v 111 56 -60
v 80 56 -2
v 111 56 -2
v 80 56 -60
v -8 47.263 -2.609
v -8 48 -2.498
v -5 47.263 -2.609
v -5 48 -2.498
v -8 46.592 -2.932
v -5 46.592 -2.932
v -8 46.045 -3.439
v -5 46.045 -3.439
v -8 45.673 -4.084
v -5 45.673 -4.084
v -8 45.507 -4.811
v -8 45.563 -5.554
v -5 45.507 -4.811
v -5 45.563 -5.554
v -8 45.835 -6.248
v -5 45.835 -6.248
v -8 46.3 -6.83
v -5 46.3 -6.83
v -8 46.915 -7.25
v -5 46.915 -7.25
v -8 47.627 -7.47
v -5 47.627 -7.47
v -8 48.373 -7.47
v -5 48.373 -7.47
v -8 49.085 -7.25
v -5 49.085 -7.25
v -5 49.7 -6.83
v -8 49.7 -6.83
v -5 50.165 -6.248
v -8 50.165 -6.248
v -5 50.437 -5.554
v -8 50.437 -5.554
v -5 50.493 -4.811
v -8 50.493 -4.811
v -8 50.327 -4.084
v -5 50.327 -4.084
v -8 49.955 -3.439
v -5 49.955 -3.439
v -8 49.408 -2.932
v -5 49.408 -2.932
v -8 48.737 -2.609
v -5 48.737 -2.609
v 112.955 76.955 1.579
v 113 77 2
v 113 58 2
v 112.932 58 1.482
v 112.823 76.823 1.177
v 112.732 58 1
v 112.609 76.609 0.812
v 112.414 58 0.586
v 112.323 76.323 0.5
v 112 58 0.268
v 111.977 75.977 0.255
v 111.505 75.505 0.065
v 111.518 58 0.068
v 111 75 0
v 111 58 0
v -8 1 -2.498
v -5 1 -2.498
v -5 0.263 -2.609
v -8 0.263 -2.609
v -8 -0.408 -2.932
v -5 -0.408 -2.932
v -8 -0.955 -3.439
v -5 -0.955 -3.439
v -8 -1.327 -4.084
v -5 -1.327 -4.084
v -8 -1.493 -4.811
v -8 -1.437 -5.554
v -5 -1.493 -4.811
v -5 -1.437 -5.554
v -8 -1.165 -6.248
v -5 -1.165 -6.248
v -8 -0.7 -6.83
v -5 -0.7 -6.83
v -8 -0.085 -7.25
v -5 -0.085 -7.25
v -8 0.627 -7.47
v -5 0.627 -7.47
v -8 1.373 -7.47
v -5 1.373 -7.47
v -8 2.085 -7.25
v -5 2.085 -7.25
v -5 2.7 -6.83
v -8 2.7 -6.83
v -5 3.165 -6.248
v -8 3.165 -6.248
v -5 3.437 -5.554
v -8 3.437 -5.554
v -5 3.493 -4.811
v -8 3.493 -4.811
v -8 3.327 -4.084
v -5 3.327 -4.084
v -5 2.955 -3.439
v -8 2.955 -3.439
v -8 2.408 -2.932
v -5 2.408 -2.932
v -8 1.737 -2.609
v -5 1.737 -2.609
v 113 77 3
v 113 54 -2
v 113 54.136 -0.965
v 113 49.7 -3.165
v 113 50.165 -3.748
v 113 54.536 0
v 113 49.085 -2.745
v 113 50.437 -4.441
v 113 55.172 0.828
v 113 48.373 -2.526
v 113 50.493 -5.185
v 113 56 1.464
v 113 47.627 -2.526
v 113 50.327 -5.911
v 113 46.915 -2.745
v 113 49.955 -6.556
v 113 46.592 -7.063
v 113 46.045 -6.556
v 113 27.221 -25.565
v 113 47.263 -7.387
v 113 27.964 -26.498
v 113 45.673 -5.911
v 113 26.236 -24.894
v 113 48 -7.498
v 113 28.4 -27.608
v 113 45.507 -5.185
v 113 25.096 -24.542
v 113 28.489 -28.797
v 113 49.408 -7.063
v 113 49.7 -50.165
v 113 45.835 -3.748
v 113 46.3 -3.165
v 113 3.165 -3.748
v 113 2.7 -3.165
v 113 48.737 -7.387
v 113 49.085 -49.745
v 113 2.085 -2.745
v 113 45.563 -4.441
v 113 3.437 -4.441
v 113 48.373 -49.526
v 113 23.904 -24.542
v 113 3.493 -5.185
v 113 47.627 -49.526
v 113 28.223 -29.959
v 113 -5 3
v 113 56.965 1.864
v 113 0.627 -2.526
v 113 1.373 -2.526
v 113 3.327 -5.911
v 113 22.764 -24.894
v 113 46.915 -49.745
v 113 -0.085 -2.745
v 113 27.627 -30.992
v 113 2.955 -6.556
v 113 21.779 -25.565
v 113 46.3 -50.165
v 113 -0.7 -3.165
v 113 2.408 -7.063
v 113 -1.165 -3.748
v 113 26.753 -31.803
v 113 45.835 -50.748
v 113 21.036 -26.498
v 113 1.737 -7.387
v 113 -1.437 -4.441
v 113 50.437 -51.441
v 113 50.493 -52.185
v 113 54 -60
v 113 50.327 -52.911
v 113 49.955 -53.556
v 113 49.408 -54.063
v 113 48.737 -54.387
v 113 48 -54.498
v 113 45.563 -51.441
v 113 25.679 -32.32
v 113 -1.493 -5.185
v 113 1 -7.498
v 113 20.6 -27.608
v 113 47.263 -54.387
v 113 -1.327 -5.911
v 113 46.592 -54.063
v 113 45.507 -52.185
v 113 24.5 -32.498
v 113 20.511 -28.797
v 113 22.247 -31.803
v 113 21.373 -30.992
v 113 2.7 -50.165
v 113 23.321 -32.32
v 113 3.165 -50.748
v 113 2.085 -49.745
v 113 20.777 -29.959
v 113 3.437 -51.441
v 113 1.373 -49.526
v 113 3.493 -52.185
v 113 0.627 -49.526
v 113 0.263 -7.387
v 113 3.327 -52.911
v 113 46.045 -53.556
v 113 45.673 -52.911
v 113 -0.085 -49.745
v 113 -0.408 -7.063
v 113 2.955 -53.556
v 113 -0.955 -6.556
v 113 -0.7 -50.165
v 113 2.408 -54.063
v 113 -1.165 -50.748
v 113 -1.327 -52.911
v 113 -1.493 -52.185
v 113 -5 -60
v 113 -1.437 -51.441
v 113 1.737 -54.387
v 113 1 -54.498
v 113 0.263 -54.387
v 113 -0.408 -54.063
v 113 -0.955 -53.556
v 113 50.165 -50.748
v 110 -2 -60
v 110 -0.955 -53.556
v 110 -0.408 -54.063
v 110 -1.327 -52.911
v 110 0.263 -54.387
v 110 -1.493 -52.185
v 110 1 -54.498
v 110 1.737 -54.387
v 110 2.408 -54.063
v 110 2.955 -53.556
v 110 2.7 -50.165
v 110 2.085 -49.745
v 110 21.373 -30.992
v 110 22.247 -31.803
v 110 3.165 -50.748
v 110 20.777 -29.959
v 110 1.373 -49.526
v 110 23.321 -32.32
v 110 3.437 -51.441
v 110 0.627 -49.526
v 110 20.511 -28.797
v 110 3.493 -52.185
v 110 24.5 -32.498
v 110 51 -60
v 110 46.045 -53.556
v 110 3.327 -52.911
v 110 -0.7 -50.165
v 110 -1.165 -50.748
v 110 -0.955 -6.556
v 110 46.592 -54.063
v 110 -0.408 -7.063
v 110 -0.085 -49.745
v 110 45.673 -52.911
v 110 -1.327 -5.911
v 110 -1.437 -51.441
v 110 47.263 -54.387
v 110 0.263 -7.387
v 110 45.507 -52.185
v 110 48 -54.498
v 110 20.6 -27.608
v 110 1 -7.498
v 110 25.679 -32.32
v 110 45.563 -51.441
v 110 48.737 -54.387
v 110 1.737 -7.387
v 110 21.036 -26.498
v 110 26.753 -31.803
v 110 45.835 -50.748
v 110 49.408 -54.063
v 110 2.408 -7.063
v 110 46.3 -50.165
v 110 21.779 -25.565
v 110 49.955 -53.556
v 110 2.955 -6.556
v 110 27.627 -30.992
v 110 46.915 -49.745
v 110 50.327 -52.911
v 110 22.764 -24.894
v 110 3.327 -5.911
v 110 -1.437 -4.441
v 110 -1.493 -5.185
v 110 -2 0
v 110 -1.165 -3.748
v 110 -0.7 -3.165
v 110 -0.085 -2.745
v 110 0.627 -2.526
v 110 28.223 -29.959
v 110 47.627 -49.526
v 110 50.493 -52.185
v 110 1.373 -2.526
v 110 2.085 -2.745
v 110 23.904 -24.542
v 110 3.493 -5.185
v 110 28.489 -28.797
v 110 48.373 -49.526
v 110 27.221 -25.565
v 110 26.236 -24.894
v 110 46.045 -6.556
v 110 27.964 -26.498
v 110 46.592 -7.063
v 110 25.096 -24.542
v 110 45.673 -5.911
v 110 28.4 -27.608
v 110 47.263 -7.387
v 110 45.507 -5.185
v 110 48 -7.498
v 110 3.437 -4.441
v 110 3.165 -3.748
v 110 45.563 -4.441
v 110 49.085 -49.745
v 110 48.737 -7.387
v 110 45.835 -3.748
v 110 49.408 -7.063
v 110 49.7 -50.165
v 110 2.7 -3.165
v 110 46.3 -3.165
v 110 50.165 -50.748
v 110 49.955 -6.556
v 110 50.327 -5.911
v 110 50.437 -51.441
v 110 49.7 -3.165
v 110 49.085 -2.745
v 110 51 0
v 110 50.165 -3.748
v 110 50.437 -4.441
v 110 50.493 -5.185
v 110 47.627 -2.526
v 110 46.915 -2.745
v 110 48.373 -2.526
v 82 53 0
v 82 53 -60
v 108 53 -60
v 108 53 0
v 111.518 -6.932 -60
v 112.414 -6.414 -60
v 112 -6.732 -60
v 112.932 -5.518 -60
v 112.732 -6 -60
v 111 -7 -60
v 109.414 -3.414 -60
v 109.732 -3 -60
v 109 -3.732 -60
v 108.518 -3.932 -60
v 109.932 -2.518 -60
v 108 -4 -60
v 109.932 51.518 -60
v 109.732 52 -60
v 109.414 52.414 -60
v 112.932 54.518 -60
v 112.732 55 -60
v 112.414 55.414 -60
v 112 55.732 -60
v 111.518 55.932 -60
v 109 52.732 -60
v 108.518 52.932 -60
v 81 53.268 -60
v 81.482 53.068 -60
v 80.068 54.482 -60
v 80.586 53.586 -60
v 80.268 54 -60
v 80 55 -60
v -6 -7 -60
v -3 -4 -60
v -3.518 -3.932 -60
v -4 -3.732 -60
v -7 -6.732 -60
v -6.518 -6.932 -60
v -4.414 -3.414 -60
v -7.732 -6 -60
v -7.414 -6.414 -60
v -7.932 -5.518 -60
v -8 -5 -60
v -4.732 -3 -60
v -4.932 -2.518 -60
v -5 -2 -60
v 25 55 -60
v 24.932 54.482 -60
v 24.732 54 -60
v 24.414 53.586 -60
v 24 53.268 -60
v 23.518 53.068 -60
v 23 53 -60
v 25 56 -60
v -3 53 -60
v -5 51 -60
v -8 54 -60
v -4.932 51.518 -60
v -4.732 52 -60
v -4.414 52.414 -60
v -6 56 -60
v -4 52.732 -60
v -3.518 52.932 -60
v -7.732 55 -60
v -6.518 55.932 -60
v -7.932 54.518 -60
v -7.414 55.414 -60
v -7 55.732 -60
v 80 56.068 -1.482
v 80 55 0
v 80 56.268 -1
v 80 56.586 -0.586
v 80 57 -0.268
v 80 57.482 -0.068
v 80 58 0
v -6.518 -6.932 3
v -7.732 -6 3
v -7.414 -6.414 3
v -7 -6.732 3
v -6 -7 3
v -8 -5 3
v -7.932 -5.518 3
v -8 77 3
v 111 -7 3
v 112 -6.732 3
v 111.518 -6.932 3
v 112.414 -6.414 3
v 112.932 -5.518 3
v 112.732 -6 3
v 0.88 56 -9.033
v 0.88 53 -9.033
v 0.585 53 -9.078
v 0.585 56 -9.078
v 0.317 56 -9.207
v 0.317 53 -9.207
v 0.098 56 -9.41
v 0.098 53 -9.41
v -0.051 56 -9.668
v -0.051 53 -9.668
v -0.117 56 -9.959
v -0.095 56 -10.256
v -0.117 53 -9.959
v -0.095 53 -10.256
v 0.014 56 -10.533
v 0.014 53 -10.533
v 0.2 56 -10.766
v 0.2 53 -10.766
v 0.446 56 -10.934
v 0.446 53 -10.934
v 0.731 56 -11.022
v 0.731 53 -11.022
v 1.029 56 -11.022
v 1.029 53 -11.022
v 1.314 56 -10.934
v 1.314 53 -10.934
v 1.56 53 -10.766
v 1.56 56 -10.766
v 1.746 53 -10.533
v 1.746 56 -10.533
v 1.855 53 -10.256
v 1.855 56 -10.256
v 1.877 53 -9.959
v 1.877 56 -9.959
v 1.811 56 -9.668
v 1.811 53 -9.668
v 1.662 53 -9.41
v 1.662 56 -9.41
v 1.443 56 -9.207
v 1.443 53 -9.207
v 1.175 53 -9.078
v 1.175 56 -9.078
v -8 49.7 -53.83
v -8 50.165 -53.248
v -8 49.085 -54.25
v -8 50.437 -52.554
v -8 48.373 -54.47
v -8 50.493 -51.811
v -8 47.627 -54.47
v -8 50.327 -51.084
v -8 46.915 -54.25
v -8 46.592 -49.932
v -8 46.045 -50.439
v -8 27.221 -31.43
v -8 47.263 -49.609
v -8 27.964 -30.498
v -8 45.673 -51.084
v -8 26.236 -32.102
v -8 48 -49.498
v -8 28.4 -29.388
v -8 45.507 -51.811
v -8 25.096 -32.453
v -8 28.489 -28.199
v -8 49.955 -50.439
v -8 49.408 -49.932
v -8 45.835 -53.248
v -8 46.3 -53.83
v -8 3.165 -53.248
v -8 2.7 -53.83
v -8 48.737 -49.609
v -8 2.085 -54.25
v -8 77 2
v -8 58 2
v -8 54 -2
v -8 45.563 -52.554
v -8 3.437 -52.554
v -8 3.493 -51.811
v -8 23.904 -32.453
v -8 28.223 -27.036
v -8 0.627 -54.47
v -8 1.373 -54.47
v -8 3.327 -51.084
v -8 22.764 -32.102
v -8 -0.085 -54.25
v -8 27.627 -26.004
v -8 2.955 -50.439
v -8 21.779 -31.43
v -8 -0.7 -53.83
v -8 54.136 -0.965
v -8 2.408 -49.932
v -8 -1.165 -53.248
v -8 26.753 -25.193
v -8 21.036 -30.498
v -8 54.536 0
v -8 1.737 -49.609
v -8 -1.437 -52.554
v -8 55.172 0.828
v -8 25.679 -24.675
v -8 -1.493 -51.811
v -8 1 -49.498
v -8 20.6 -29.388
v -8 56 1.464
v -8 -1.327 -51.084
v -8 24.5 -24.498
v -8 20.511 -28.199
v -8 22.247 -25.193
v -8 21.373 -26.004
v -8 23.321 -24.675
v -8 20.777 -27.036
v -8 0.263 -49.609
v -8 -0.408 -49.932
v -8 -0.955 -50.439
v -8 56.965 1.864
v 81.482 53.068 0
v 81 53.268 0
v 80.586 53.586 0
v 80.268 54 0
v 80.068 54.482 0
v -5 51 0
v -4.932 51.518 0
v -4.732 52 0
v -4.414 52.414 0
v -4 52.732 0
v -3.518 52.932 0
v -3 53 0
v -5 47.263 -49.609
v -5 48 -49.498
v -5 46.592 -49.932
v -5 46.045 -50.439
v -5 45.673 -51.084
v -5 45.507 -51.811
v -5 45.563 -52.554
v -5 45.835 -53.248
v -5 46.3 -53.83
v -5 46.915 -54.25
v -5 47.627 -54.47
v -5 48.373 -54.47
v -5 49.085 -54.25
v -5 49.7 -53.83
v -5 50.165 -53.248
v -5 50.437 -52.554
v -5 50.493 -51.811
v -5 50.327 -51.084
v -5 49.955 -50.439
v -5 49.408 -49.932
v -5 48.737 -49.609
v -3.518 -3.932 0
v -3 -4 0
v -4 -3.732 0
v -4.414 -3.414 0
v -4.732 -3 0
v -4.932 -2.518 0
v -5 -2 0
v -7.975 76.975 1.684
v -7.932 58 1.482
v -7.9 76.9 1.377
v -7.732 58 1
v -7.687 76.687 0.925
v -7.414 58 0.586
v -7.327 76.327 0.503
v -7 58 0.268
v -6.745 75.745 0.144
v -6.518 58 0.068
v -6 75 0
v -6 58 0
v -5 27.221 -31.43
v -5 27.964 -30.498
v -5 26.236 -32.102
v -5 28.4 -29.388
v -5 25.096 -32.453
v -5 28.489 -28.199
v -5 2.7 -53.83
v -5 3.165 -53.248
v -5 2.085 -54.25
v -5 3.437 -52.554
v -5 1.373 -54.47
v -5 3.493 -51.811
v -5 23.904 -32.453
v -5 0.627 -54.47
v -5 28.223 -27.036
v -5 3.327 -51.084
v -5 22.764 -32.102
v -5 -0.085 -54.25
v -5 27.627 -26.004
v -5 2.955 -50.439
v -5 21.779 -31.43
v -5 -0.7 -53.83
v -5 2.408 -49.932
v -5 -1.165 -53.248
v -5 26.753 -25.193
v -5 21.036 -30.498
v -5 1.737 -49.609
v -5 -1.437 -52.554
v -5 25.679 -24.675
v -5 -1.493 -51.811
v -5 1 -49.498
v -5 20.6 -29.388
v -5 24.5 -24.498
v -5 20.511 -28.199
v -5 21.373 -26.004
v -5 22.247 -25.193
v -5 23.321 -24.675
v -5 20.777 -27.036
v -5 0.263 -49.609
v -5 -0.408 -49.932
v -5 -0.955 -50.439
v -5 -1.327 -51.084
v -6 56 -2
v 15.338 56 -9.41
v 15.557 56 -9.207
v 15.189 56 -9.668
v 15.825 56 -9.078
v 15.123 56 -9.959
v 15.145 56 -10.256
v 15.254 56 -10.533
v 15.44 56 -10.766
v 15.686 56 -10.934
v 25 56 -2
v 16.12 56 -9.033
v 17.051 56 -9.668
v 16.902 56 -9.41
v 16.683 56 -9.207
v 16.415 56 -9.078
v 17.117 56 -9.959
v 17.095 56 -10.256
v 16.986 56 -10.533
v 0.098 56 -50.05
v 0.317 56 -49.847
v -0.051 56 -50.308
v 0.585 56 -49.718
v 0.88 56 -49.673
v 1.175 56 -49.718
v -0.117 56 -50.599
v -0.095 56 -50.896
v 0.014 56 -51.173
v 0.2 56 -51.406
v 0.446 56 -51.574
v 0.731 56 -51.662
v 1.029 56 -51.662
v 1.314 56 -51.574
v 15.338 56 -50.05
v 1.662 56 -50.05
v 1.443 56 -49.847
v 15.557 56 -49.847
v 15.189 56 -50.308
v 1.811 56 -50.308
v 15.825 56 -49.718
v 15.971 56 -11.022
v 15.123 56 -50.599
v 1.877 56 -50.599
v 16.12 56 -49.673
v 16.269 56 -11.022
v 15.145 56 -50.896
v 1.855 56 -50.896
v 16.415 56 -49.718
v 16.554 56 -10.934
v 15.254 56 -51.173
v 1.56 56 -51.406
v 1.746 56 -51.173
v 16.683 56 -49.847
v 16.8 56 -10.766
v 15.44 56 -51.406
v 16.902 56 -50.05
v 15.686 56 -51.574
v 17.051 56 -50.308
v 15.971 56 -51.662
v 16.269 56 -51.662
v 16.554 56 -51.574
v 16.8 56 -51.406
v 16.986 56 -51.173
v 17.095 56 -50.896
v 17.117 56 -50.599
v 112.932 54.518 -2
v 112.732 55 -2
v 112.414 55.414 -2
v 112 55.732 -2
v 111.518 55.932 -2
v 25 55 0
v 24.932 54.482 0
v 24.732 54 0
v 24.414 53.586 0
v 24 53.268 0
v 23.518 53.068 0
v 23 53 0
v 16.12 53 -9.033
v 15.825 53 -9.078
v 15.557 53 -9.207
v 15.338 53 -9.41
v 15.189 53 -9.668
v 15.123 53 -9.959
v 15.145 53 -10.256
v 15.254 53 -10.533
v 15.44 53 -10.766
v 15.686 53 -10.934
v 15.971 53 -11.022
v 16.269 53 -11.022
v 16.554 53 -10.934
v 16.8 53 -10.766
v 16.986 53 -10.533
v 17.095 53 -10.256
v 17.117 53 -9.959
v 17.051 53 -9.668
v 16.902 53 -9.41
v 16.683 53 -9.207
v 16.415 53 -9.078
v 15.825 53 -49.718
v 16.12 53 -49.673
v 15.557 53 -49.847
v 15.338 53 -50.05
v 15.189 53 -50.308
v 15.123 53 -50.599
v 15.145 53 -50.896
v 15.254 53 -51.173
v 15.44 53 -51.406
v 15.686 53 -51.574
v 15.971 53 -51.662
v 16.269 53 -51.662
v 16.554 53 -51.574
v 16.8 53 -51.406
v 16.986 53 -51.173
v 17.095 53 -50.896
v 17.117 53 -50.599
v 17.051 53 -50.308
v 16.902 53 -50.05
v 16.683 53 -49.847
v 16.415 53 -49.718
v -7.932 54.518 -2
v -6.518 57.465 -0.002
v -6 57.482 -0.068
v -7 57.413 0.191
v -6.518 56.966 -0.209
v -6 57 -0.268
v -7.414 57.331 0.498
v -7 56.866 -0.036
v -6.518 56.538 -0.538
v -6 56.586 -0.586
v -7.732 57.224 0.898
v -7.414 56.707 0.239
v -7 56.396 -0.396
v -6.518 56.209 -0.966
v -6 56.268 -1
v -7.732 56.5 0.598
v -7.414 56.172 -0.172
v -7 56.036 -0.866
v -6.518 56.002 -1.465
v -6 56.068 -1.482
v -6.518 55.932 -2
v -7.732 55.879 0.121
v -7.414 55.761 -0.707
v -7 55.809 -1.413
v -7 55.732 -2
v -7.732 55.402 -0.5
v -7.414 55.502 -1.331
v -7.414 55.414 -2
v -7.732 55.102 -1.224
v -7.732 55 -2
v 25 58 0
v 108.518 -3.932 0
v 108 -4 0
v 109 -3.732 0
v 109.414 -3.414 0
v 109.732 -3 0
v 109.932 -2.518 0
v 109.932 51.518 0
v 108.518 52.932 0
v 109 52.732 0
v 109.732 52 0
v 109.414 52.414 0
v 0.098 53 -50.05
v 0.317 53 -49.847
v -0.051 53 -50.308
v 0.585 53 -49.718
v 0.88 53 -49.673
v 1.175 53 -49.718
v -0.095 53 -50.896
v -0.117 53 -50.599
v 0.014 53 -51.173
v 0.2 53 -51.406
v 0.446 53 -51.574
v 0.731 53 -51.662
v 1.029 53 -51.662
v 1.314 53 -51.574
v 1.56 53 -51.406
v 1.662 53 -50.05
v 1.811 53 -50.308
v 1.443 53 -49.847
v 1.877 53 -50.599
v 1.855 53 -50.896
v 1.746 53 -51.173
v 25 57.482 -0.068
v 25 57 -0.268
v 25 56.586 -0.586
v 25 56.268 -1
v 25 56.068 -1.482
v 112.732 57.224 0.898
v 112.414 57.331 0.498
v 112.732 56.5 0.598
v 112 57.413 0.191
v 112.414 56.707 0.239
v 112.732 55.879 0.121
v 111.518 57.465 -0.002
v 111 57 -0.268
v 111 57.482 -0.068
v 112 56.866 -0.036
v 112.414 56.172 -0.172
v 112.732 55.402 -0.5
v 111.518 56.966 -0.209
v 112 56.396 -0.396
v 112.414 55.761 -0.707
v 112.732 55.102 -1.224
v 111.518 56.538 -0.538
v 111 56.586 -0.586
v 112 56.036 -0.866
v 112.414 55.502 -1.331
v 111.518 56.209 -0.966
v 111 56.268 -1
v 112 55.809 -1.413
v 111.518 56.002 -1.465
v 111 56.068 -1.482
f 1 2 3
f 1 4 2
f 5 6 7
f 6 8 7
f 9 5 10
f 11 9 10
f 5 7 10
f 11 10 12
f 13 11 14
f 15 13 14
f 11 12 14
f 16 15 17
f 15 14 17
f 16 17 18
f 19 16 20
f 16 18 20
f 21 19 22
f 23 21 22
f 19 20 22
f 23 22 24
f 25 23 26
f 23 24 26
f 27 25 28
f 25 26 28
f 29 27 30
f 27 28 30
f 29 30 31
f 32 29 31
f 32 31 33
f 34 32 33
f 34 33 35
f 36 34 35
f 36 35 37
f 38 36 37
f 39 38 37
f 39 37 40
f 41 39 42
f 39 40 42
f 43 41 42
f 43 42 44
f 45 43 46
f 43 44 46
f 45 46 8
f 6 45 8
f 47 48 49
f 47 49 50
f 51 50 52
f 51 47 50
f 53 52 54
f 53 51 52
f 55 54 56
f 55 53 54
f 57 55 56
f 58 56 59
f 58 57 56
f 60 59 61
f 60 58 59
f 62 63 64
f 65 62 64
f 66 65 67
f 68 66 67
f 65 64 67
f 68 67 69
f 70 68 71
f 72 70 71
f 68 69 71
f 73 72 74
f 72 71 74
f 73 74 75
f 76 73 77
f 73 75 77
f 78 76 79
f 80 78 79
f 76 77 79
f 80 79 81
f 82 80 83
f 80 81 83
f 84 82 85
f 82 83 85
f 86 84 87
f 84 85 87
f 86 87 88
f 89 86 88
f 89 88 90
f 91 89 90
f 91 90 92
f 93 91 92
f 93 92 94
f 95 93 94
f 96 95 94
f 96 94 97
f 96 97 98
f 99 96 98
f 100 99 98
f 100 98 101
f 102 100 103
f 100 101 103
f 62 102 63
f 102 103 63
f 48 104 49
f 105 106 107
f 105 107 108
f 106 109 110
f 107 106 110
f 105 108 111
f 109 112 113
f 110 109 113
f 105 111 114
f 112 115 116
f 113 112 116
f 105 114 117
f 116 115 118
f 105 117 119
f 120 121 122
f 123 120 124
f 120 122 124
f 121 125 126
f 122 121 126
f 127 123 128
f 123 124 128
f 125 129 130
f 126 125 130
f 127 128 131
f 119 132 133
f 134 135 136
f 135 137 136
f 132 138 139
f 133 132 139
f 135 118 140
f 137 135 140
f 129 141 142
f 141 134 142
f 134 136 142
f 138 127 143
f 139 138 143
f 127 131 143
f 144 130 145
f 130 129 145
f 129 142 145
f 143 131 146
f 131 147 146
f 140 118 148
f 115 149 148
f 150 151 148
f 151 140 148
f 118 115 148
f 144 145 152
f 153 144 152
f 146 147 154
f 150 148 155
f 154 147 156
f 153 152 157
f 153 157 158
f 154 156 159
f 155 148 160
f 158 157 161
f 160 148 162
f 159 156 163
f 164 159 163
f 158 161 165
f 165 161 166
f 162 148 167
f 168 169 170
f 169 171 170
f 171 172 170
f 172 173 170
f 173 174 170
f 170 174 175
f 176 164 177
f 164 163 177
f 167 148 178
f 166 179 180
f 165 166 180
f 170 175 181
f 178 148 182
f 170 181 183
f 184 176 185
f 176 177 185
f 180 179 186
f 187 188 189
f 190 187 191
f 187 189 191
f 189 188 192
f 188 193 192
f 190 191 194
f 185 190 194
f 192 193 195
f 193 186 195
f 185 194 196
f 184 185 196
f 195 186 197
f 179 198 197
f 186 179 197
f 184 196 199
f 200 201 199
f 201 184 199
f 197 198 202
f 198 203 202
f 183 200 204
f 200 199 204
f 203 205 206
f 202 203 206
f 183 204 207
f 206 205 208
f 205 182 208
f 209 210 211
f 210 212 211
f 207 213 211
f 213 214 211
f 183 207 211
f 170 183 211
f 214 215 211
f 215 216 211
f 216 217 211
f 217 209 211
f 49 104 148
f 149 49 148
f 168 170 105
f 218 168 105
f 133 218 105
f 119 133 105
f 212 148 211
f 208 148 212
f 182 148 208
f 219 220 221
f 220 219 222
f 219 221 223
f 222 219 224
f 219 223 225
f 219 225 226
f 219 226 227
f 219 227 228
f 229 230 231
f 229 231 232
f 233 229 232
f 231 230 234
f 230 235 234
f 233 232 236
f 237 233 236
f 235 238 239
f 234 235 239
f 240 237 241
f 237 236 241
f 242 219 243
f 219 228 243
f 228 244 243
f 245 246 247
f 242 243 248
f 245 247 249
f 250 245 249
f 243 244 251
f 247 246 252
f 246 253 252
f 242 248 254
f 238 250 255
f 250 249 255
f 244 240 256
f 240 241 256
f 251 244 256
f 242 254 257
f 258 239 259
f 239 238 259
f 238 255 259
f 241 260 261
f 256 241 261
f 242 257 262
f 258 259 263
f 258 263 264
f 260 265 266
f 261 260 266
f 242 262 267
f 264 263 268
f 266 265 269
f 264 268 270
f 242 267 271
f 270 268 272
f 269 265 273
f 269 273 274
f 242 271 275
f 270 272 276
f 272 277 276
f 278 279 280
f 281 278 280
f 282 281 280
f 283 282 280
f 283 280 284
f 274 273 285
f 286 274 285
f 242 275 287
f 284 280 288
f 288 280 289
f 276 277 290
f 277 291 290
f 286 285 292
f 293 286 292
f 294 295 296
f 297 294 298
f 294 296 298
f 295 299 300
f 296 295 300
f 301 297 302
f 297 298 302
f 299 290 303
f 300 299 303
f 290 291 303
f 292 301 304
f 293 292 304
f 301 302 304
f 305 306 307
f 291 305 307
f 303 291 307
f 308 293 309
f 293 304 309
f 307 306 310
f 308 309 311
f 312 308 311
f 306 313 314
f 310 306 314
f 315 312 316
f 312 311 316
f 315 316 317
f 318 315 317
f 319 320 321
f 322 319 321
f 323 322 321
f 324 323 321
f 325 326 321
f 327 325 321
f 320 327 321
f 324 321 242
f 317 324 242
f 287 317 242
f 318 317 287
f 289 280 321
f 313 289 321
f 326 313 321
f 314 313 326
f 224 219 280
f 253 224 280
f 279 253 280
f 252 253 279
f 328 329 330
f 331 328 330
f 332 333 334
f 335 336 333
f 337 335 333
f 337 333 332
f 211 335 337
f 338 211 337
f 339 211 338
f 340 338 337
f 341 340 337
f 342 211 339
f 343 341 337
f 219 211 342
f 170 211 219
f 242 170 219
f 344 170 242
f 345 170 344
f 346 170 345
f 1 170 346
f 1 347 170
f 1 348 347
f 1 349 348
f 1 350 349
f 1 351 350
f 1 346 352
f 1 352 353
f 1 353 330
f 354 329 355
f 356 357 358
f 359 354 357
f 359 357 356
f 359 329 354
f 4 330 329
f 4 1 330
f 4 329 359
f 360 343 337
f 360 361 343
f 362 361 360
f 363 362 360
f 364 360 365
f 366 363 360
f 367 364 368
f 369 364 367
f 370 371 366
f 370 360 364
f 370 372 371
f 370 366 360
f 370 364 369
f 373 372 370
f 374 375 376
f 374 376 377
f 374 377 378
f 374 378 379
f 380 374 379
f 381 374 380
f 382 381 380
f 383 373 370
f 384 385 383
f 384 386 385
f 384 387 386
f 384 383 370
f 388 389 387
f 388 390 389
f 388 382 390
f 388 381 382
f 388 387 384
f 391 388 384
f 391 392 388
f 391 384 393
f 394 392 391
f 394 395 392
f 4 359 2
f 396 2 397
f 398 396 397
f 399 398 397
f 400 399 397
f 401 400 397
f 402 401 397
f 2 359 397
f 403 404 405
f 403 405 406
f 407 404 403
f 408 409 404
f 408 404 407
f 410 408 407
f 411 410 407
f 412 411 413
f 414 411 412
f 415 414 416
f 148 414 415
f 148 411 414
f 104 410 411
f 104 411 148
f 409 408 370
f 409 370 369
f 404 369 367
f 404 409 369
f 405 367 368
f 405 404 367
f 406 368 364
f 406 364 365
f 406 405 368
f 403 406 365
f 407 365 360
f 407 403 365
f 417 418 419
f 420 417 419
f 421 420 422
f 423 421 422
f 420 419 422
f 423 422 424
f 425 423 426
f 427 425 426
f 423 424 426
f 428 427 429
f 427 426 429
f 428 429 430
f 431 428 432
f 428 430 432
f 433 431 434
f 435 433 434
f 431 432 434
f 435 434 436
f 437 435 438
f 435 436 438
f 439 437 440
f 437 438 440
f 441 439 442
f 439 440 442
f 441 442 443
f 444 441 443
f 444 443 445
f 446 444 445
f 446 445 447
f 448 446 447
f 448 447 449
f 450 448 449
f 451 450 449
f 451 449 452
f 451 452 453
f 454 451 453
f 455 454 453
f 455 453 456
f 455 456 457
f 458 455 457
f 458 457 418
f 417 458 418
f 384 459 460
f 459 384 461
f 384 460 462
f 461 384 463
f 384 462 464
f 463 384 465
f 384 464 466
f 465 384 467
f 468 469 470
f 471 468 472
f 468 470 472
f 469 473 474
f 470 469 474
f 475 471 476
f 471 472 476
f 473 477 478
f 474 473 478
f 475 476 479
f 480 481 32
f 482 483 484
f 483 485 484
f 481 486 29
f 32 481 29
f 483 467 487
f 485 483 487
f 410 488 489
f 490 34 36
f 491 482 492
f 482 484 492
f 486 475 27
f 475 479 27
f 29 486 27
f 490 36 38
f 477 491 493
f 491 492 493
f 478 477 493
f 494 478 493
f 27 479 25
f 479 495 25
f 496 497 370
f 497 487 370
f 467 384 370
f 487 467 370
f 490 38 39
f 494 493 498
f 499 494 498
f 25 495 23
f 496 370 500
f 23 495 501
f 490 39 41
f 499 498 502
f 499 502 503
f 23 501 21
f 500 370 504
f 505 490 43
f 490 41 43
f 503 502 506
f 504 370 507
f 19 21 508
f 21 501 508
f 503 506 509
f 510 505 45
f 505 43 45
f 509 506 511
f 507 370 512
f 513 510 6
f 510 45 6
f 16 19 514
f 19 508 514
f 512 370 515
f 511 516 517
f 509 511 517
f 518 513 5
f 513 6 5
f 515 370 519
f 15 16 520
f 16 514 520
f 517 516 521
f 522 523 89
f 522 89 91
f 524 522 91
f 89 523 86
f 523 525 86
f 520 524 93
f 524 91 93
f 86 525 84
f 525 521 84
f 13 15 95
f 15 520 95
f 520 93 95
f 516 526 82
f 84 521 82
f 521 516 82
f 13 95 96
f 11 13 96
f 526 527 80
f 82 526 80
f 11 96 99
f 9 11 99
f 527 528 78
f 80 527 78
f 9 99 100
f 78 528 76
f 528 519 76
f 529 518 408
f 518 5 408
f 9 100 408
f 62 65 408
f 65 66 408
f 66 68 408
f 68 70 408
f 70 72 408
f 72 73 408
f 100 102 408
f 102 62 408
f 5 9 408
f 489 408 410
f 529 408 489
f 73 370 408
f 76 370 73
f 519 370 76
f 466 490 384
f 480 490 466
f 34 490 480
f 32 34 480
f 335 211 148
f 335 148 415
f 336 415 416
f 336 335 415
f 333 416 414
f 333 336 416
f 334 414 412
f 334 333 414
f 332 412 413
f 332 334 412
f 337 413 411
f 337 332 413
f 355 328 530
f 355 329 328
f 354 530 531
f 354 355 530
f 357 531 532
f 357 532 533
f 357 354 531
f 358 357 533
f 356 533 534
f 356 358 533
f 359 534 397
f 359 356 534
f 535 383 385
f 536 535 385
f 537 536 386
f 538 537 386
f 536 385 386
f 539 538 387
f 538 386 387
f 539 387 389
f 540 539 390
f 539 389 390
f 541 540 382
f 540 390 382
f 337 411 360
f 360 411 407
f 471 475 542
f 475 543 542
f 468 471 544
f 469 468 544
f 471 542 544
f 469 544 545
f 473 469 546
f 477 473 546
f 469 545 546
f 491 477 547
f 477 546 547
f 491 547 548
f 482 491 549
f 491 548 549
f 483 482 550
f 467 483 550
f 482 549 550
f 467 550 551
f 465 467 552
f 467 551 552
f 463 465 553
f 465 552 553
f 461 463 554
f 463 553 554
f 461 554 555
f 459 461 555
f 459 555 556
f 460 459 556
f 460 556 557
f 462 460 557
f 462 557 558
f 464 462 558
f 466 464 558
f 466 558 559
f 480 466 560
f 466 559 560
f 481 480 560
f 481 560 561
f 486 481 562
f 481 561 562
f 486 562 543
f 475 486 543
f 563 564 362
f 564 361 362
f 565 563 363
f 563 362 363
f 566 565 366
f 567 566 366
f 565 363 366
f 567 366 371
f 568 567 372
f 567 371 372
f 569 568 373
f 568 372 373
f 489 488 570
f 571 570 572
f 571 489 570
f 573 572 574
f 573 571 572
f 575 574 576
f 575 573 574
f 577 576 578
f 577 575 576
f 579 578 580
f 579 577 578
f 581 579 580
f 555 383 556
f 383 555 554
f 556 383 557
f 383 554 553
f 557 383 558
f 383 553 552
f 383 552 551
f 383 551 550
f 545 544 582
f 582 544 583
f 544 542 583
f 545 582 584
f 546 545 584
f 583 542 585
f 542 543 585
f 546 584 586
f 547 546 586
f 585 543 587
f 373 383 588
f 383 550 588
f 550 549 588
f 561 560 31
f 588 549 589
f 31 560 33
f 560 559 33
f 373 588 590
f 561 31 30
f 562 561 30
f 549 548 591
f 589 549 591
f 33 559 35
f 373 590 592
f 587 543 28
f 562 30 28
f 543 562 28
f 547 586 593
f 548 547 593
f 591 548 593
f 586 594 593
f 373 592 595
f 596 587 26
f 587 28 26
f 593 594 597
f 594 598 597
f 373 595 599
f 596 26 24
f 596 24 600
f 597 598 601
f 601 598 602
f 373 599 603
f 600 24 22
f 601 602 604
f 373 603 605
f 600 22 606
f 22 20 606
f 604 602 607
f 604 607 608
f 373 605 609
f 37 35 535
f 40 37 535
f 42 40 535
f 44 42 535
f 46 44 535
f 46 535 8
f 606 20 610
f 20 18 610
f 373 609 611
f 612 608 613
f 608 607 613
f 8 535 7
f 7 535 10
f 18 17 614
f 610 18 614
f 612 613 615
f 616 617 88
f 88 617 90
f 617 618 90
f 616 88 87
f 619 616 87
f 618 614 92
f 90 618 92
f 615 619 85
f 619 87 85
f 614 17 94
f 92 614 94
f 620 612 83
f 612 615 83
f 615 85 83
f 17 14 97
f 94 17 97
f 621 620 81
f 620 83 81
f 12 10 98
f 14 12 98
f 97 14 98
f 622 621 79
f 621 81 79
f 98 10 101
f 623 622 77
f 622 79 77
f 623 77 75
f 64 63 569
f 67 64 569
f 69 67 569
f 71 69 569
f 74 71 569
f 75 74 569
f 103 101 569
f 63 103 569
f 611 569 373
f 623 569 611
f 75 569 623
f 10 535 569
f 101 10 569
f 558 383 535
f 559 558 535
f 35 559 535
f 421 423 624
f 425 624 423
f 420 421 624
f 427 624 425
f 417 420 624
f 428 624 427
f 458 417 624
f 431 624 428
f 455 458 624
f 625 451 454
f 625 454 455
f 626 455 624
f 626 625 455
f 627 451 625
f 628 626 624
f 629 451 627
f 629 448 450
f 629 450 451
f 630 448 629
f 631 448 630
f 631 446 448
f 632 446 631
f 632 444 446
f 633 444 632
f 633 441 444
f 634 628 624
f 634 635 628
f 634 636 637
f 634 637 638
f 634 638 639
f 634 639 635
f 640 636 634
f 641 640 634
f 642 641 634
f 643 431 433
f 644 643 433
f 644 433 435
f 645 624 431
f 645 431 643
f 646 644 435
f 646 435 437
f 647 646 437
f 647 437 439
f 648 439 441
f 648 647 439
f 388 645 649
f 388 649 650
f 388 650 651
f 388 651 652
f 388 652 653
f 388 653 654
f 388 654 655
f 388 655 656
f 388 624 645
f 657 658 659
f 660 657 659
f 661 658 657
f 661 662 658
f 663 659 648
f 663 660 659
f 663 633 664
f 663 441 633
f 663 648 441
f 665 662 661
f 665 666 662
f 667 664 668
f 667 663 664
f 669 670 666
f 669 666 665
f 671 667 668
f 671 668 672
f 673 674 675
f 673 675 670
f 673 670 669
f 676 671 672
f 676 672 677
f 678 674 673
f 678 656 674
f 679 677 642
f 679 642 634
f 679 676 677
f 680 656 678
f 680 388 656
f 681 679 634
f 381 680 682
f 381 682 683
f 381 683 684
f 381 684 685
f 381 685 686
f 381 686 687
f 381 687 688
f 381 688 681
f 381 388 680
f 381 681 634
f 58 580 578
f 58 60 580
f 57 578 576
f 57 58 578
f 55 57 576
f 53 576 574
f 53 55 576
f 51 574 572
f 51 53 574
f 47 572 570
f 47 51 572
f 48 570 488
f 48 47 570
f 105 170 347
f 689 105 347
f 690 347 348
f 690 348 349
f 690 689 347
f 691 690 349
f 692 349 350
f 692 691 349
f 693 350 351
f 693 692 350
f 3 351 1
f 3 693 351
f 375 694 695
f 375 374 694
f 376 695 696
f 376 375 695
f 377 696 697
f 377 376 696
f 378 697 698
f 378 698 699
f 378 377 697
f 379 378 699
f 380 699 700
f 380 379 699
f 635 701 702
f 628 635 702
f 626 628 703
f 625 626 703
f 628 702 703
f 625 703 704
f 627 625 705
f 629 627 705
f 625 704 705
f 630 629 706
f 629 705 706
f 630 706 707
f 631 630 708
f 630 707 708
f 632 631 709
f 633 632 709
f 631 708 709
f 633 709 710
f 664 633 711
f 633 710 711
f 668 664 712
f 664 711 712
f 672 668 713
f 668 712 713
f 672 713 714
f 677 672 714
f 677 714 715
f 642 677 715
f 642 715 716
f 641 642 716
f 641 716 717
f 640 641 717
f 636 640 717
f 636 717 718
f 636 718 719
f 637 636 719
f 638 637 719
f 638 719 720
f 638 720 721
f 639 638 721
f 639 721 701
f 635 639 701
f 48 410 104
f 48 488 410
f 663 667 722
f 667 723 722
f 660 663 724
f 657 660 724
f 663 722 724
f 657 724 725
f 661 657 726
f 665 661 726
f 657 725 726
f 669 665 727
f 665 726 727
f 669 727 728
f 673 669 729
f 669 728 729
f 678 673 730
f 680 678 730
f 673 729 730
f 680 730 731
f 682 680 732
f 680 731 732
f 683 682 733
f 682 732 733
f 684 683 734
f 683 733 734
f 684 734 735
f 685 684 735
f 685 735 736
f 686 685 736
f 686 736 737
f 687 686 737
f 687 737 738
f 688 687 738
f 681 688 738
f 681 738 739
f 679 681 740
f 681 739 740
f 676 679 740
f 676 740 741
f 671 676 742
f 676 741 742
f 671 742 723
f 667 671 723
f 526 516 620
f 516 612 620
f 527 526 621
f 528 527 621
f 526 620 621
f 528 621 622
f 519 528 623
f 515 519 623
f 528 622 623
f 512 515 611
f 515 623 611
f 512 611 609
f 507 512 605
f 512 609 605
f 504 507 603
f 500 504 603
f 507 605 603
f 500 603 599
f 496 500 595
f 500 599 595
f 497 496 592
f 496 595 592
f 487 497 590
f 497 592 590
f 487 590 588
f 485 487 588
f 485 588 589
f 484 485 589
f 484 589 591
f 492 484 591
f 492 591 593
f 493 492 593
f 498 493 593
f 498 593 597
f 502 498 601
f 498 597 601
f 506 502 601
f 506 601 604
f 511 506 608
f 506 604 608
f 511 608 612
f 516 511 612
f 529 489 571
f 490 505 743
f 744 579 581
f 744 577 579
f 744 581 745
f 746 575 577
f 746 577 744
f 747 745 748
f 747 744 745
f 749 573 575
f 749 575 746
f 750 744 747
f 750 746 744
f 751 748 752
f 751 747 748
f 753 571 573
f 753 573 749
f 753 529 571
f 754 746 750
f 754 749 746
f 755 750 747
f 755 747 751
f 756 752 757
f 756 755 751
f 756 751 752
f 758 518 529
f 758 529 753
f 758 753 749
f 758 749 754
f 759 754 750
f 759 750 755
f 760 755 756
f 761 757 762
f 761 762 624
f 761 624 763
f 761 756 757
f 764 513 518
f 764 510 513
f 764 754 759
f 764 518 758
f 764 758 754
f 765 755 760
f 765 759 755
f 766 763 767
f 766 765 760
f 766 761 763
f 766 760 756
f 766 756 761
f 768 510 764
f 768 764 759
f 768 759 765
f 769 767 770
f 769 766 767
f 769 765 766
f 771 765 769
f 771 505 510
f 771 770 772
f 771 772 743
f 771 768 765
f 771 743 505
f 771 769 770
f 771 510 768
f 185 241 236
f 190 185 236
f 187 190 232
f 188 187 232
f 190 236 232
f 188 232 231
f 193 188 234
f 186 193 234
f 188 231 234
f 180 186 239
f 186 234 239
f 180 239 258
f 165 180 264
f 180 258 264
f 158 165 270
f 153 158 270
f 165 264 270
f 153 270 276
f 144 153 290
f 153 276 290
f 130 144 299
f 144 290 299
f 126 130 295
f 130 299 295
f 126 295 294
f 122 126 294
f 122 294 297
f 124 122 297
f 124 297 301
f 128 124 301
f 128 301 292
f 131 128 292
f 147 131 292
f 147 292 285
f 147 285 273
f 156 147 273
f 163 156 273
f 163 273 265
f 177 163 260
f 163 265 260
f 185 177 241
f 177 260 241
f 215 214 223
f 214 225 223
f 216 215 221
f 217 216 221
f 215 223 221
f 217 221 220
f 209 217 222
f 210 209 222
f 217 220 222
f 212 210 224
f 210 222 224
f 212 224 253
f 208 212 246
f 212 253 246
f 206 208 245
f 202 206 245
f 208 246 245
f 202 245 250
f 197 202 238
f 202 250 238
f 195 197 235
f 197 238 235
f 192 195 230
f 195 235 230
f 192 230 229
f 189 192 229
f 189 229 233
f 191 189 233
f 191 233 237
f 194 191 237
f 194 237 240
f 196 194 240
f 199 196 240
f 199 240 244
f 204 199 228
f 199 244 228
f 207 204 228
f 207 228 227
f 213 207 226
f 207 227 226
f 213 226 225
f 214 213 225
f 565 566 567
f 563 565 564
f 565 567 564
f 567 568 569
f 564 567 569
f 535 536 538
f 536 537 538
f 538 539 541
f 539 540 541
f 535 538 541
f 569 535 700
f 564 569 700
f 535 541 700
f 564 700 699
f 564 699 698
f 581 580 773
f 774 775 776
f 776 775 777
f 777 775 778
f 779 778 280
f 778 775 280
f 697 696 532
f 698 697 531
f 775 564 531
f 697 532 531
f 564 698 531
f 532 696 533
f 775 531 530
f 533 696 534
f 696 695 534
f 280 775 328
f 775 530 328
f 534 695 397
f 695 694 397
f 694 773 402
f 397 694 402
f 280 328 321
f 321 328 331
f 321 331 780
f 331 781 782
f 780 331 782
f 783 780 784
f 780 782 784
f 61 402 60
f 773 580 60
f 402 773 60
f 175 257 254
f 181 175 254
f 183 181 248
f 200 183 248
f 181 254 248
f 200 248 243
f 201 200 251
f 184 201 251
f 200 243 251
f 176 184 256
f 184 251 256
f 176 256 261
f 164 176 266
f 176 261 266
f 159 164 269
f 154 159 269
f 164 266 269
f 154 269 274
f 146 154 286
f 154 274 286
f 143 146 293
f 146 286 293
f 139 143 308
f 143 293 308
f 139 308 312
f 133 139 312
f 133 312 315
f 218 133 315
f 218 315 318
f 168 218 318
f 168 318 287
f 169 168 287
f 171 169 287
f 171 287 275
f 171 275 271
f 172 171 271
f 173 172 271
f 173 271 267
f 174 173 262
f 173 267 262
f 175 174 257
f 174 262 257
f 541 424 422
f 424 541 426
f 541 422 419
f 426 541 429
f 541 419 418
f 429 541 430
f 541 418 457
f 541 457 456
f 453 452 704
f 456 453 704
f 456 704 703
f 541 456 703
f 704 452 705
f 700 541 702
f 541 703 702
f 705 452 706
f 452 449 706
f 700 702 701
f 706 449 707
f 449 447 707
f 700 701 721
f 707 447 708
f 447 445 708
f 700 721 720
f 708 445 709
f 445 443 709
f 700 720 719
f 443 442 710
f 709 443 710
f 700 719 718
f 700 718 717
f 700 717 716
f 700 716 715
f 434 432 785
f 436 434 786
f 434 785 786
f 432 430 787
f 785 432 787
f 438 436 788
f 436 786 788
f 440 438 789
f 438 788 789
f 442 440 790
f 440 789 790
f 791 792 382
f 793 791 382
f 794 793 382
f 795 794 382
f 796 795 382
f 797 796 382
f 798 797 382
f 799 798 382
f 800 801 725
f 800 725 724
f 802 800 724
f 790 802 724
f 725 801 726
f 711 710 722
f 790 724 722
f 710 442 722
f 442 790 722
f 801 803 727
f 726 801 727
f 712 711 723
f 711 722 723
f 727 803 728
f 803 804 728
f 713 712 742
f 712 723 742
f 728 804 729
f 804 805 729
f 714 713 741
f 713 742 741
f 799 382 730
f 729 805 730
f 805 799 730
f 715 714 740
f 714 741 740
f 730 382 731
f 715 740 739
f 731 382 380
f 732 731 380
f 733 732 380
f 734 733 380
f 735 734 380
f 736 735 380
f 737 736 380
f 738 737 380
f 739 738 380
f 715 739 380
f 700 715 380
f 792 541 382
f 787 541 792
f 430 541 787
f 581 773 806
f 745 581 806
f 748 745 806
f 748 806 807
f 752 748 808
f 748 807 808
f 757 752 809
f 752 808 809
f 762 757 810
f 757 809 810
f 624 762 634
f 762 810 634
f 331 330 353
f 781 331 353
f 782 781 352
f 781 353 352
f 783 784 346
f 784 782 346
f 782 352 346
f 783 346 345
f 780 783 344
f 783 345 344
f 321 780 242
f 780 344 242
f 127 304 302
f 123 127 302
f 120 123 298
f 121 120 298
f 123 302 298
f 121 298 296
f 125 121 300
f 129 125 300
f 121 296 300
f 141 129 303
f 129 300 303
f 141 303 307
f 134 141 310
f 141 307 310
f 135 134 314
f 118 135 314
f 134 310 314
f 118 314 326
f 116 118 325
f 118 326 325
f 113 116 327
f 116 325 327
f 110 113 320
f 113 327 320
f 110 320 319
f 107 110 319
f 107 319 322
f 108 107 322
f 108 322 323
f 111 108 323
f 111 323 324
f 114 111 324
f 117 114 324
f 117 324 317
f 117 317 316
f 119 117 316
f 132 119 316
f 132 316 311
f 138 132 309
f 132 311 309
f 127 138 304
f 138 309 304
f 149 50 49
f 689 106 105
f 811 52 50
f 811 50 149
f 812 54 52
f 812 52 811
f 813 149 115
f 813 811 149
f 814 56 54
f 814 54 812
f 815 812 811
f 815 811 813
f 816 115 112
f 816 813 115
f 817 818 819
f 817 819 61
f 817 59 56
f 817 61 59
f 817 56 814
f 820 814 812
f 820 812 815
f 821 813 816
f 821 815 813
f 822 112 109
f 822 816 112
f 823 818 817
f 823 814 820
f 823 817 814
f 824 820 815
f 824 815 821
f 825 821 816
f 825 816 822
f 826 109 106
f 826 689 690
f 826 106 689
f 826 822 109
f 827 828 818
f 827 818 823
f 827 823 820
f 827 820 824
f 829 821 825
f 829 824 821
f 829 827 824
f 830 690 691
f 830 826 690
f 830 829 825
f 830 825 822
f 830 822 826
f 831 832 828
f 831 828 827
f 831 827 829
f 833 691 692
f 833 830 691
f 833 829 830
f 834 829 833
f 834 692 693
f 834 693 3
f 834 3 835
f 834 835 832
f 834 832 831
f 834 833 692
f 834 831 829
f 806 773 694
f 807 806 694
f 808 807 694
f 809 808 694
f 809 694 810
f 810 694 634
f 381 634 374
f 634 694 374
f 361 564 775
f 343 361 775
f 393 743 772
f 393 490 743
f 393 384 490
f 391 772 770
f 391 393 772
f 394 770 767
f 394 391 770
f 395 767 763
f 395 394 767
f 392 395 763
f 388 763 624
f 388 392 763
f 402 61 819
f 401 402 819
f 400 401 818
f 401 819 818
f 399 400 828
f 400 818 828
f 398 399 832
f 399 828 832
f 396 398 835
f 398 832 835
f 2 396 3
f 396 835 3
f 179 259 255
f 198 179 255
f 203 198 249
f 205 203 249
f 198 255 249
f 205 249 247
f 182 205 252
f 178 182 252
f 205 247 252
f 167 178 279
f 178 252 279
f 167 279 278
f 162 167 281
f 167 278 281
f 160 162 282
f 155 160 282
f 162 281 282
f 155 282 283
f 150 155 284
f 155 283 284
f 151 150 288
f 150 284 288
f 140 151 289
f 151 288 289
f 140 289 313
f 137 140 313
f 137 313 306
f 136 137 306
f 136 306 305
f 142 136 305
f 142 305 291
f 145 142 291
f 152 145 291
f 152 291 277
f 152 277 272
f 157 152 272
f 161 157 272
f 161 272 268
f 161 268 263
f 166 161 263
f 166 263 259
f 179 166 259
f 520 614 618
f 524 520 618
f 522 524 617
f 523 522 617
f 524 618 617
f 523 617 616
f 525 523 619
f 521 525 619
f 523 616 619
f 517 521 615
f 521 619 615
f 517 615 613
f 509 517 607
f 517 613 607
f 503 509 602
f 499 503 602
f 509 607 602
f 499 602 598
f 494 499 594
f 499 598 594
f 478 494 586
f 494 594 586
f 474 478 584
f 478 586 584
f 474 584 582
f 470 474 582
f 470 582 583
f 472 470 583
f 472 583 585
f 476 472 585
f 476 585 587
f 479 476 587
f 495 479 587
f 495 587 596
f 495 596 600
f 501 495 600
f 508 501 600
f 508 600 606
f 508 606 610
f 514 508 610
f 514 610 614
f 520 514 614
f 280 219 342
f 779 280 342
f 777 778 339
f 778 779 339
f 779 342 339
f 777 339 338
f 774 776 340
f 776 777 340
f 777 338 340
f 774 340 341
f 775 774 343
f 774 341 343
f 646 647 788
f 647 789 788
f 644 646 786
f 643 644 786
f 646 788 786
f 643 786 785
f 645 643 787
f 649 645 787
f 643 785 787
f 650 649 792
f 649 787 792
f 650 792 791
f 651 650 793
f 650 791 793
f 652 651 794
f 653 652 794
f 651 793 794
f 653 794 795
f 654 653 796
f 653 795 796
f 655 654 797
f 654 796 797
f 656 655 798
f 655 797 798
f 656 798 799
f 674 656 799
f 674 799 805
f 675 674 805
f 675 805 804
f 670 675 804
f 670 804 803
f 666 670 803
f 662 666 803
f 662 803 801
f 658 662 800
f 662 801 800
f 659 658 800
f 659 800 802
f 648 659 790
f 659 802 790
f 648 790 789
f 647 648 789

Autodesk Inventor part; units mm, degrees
ref_plane "YZ Plane" through (0, 0, 0) normal (1, 0, 0) x (0, 1, 0)
ref_plane "XZ Plane" through (0, 0, 0) normal (0, 1, 0) x (-1, 0, 0)
ref_plane "XY Plane" through (0, 0, 0) normal (0, 0, 1) x (1, 0, 0)
sketch "Boceto1" plane through (0, 0, 0) normal (0, 0, 1) x (1, 0, 0)
  line L0 (105, 0) -> (105, 24.5) projected
  line L1 (0, 24.5) -> (0, 0) projected
  line L2 (105, 24.5) -> (0, 24.5)
  line L3 (113, 129.5) -> (-8, 129.5)
  line L4 (-8, 129.5) -> (-8, -80.5)
  line L5 (-8, -80.5) -> (113, -80.5)
  line L6 (113, -80.5) -> (113, 129.5)
  line L7 (113, 129.5) -> (-8, -80.5) construction
  line L8 (-8, 129.5) -> (113, -80.5) construction
  point P0 (52.5, 24.5)
  dimension "d0" = 121
  dimension "d1" = 210
extrude "Extrusión1" add sketch "Boceto1" along normal blind 3
sketch "Boceto2" plane through (0, 0, 0) normal (0, 0, -1) x (-1, 0, 0)
  line L0 (0, 53) -> (5, 53) projected
  line L1 (0, -4) -> (5, -4) projected
  line L2 (5, 53) -> (8, 53)
  line L3 (8, 129.5) -> (8, -80.5) projected
  line L4 (5, -4) -> (8, -4)
  line L5 (8, -4) -> (8, 53)
  line L6 (8, 53) -> (5, 53)
  line L7 (5, 53) -> (5, -4)
  point P0 (0, 0)
ref_plane "Plano de trabajo1" through (52.5, -80.5, 0) normal (-1, 0, 0) x (0, 0, 1)
extrude "Extrusión2" add sketch "Boceto2" along normal blind 60
sketch "Boceto3" plane through (-8, -80.5, 3) normal (-1, 0, 0) x (0, 0, 1)
  circle A0 centre (-54.9977, 81.5) radius 3 projected
  circle A1 centre (-54.9977, 128.5) radius 3 projected
  circle A2 centre (-7.9977, 128.5) radius 3 projected
  circle A3 centre (-7.9977, 81.5) radius 3 projected
  point P0 (-3, 80.5)
hole "Agujero1" at (-8, 1, -51.9977) at (-8, 48, -51.9977) at (-8, 48, -4.9977) at (-8, 1, -4.9977) direction (1, 0, 0) diameter 5 end up to surface
sketch "Boceto4" plane through (-8, -80.5, 3) normal (-1, 0, 0) x (0, 0, 1)
  circle A0 centre (-31.4977, 105) radius 4 projected
  circle A1 centre (-31.4977, 105) radius 4
  point P0 (-3, 80.5)
  dimension "d13" = 8
hole "Agujero2" at (-8, 24.5, -28.4977) direction (1, 0, 0) diameter 8 end up to surface
sketch "Boceto5" plane through (-8, 53, 0) normal (0, 1, 0) x (1, 0, 0)
  line L0 (3, 0) -> (33, 0)
  line L1 (33, 0) -> (33, 60)
  line L2 (33, 60) -> (3, 60)
  line L3 (3, 60) -> (0, 60)
  line L4 (0, 60) -> (0, 0)
  line L5 (0, 0) -> (3, 0)
  line L6 (33, 60) -> (33, 0)
  line L7 (33, 60) -> (0, 60)
  line L8 (0, 60) -> (0, 0)
  line L9 (0, 0) -> (33, 0)
  line L10 (33, 0) -> (33, 60)
  point P0 (8, 0)
  dimension "d21" = 30
  dimension "d22" = 60
extrude "Extrusión3" add sketch "Boceto5" along normal blind 3
sketch "Boceto6" plane through (-8, 56, 0) normal (0, 1, 0) x (1, 0, 0)
  circle A0 centre (8.88, 50.6734) radius 0.889 projected
  circle A1 centre (24.12, 50.6734) radius 0.889 projected
  circle A2 centre (24.12, 10.0334) radius 0.889 projected
  circle A3 centre (8.88, 10.0334) radius 0.889 projected
  point P0 (8, 0)
hole "Agujero3" at (16.12, 56, -50.6734) at (0.88, 56, -50.6734) at (16.12, 56, -10.0334) at (0.88, 56, -10.0334) direction (0, -1, 0) diameter 2 end up to surface
mirror "Simetría1" about plane through (52.5, -80.5, 0) normal (-1, 0, 0) of "Extrusión3", "Agujero2", "Agujero1", "Extrusión2"
fillet "Empalme1" radius 2 2 edges at (96.5, 56, 0) (8.5, 56, 0)
sketch "Boceto7" plane through (0, 0, 0) normal (0, 0, -1) x (-1, 0, 0)
  line L0 (8, -4) -> (8, -7)
  line L1 (8, -4) -> (8, -80.5) projected
  line L2 (8, -7) -> (-113, -7)
  line L3 (-113, -80.5) -> (-113, 129.5) projected
  line L4 (-113, -80.5) -> (-113, -7)
  line L5 (-113, -80.5) -> (-113, -4) projected
  line L6 (-113, -80.5) -> (8, -80.5)
  line L7 (8, -80.5) -> (8, -7)
  point P0 (0, 0)
  dimension "d33" = 3
extrude "Extrusión4" cut sketch "Boceto7" against normal blind 3
sketch "Boceto8" plane through (0, 0, 0) normal (0, 0, -1) x (-1, 0, 0)
  line L0 (-113, -4) -> (-113, -7)
  line L1 (-113, -7) -> (8, -7)
  line L2 (8, -7) -> (8, -4)
  line L3 (8, -4) -> (-113, -4)
  point P0 (0, 0)
  dimension "d36" = 3
  dimension "d37" = 121
  dimension "d38" = 3
extrude "Extrusión5" add sketch "Boceto8" along normal blind 60
sketch "Boceto9" plane through (0, 0, -60) normal (0, 0, -1) x (-1, 0, 0)
  point P0 (0, 0)
sketch "Boceto10" plane through (0, 0, 0) normal (0, 0, -1) x (-1, 0, 0)
  line L0 (-46.8669, 72) -> (-100.1331, 72) projected
  line L1 (-46.8669, 77) -> (-100.1331, 77)
  line L2 (-100.1331, 77) -> (-113, 77)
  line L3 (-113, 58) -> (-113, 129.5) projected
  line L4 (-46.8669, 77) -> (6.9064, 77)
  line L5 (6.9064, 77) -> (8, 77)
  line L6 (8, 129.5) -> (8, 58) projected
  line L7 (-113, 77) -> (8.9757, 77)
  line L8 (8.9757, 77) -> (8.9757, 129.5)
  line L9 (8.9757, 129.5) -> (-113, 129.5)
  line L10 (-113, 129.5) -> (-113, 77)
  point P0 (0, 0)
  dimension "d41" = 5
extrude "Extrusión6" cut sketch "Boceto10" against normal blind 10
fillet "Empalme2" radius 2 11 edges at (-5, 53, -30) (-8, 56.5858, -0.5858) (-8, 67.5, 0) (-8, 56, -31) (-5, -4, -30) (110, -4, -30) (110, 53, -30) (113, 56.5858, -0.5858) (113, 67.5, 0) (113, 56, -31) (52.5, 77, 0)
fillet "Empalme3" radius 2 2 edges at (80, 53, -30) (25, 53, -30)
fillet "Empalme4" radius 2 2 edges at (113, -7, -28.5) (-8, -7, -28.5)
properties part number "base"
